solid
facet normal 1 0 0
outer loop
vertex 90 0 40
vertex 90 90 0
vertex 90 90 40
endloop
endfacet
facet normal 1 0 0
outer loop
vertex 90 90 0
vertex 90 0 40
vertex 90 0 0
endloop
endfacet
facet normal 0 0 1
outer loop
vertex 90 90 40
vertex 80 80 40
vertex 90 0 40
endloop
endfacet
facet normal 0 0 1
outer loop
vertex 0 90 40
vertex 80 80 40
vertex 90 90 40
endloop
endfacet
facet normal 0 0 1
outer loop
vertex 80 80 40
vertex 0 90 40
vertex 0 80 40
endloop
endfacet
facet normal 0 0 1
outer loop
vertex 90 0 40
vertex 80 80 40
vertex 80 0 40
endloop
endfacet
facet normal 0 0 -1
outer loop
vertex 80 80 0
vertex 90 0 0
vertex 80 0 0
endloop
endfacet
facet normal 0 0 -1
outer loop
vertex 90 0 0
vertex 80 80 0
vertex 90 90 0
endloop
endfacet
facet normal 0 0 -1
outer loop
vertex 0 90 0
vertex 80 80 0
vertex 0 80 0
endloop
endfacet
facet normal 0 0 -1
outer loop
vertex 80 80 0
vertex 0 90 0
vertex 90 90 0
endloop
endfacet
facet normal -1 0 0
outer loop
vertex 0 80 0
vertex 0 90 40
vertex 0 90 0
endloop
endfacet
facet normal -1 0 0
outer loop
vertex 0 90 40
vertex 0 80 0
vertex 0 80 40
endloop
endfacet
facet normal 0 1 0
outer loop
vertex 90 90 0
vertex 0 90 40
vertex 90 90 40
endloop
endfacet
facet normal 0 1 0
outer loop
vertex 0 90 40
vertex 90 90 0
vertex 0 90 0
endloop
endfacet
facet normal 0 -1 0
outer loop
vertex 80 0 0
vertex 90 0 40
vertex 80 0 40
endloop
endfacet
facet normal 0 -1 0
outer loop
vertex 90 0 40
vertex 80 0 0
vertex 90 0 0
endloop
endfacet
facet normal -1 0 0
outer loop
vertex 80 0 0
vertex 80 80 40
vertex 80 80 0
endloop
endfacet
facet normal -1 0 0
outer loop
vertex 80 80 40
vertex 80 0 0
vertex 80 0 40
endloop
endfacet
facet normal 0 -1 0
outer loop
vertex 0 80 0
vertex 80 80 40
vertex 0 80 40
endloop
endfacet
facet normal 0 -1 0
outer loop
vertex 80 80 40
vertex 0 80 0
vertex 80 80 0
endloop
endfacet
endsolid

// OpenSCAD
// DIY Magnetic Stirrer Housing - built upside down on the print bed.
// Top plate (z=0 to 2) with M4 screw holes, four walls rising to z=40.
// Outer size: 90x90mm. Fan size: 80x80mm.

$fn = 64;

// Dimensions
outer_w = 90;
outer_h = 90;
top_t   = 2;
wall_t  = 2.5;
box_h   = 40; // Total height from bed to open top
fan_w   = 80; // Inner clear width for the fan

// Screw holes
screw_d = 4.5;
screw_p = 71.5; // Pattern size (distance between centers)

// Cable notch
notch_w = 12;
notch_h = 8; // Depth from open edge (z=40) down to z=32

// Derived positions
// Hole positions: 71.5mm square pattern centered on origin.
// Distance from center to hole = 71.5 / 2 = 35.75.
hole_offset = screw_p / 2;

// Generate the four screw hole coordinates using a list comprehension.
// We want the pattern: (-,-), (+,-), (+,+), (-,+)
// i=0 -> (-,-), i=1 -> (+,-), i=2 -> (+,+), i=3 -> (-,+)
// Logic: X is positive for i=1,2. Y is positive for i=2,3.
screw_coords = [for (i = [0 : 3]) let(
    x = (i >= 1 && i <= 2) ? hole_offset : -hole_offset,
    y = (i >= 2 && i <= 3) ? hole_offset : -hole_offset
) [x, y]];

module build_housing() {
    difference() {
        // 1. The solid outer block
        translate([0, 0, 0]) 
            cube([outer_w, outer_h, box_h]);

        // 2. Cut the internal void (the fan space)
        // The void is centered, has size fan_w x fan_w, and goes from z=0 to z=box_h.
        // We extend the cut slightly past the top and bottom to ensure clean faces.
        translate([0, 0, -1]) 
            cube([fan_w, fan_w, box_h + 2]);

        // 3. Cut the four screw holes through the top plate
        // Holes are at z=0 to z=top_t.
        for (pos = screw_coords) {
            translate(pos)
                cylinder(h = top_t + 1, d = screw_d); // +1 to cut slightly past top
        }

        // 4. Cut the cable notch in one wall
        // Placed in the wall at X = -outer_w/2 + wall_t/2 (Left wall).
        // Notch width: notch_w.
        // Notch depth: notch_h (from open edge z=box_h down to z=box_h-notch_h).
        // Position: Centered along the wall (Y=0).
        
        wall_x_pos = -outer_w / 2 + wall_t / 2;
        
        translate([wall_x_pos, 0, box_h - notch_h])
            cube([notch_w, wall_t, notch_h]);
    }
}

build_housing();
